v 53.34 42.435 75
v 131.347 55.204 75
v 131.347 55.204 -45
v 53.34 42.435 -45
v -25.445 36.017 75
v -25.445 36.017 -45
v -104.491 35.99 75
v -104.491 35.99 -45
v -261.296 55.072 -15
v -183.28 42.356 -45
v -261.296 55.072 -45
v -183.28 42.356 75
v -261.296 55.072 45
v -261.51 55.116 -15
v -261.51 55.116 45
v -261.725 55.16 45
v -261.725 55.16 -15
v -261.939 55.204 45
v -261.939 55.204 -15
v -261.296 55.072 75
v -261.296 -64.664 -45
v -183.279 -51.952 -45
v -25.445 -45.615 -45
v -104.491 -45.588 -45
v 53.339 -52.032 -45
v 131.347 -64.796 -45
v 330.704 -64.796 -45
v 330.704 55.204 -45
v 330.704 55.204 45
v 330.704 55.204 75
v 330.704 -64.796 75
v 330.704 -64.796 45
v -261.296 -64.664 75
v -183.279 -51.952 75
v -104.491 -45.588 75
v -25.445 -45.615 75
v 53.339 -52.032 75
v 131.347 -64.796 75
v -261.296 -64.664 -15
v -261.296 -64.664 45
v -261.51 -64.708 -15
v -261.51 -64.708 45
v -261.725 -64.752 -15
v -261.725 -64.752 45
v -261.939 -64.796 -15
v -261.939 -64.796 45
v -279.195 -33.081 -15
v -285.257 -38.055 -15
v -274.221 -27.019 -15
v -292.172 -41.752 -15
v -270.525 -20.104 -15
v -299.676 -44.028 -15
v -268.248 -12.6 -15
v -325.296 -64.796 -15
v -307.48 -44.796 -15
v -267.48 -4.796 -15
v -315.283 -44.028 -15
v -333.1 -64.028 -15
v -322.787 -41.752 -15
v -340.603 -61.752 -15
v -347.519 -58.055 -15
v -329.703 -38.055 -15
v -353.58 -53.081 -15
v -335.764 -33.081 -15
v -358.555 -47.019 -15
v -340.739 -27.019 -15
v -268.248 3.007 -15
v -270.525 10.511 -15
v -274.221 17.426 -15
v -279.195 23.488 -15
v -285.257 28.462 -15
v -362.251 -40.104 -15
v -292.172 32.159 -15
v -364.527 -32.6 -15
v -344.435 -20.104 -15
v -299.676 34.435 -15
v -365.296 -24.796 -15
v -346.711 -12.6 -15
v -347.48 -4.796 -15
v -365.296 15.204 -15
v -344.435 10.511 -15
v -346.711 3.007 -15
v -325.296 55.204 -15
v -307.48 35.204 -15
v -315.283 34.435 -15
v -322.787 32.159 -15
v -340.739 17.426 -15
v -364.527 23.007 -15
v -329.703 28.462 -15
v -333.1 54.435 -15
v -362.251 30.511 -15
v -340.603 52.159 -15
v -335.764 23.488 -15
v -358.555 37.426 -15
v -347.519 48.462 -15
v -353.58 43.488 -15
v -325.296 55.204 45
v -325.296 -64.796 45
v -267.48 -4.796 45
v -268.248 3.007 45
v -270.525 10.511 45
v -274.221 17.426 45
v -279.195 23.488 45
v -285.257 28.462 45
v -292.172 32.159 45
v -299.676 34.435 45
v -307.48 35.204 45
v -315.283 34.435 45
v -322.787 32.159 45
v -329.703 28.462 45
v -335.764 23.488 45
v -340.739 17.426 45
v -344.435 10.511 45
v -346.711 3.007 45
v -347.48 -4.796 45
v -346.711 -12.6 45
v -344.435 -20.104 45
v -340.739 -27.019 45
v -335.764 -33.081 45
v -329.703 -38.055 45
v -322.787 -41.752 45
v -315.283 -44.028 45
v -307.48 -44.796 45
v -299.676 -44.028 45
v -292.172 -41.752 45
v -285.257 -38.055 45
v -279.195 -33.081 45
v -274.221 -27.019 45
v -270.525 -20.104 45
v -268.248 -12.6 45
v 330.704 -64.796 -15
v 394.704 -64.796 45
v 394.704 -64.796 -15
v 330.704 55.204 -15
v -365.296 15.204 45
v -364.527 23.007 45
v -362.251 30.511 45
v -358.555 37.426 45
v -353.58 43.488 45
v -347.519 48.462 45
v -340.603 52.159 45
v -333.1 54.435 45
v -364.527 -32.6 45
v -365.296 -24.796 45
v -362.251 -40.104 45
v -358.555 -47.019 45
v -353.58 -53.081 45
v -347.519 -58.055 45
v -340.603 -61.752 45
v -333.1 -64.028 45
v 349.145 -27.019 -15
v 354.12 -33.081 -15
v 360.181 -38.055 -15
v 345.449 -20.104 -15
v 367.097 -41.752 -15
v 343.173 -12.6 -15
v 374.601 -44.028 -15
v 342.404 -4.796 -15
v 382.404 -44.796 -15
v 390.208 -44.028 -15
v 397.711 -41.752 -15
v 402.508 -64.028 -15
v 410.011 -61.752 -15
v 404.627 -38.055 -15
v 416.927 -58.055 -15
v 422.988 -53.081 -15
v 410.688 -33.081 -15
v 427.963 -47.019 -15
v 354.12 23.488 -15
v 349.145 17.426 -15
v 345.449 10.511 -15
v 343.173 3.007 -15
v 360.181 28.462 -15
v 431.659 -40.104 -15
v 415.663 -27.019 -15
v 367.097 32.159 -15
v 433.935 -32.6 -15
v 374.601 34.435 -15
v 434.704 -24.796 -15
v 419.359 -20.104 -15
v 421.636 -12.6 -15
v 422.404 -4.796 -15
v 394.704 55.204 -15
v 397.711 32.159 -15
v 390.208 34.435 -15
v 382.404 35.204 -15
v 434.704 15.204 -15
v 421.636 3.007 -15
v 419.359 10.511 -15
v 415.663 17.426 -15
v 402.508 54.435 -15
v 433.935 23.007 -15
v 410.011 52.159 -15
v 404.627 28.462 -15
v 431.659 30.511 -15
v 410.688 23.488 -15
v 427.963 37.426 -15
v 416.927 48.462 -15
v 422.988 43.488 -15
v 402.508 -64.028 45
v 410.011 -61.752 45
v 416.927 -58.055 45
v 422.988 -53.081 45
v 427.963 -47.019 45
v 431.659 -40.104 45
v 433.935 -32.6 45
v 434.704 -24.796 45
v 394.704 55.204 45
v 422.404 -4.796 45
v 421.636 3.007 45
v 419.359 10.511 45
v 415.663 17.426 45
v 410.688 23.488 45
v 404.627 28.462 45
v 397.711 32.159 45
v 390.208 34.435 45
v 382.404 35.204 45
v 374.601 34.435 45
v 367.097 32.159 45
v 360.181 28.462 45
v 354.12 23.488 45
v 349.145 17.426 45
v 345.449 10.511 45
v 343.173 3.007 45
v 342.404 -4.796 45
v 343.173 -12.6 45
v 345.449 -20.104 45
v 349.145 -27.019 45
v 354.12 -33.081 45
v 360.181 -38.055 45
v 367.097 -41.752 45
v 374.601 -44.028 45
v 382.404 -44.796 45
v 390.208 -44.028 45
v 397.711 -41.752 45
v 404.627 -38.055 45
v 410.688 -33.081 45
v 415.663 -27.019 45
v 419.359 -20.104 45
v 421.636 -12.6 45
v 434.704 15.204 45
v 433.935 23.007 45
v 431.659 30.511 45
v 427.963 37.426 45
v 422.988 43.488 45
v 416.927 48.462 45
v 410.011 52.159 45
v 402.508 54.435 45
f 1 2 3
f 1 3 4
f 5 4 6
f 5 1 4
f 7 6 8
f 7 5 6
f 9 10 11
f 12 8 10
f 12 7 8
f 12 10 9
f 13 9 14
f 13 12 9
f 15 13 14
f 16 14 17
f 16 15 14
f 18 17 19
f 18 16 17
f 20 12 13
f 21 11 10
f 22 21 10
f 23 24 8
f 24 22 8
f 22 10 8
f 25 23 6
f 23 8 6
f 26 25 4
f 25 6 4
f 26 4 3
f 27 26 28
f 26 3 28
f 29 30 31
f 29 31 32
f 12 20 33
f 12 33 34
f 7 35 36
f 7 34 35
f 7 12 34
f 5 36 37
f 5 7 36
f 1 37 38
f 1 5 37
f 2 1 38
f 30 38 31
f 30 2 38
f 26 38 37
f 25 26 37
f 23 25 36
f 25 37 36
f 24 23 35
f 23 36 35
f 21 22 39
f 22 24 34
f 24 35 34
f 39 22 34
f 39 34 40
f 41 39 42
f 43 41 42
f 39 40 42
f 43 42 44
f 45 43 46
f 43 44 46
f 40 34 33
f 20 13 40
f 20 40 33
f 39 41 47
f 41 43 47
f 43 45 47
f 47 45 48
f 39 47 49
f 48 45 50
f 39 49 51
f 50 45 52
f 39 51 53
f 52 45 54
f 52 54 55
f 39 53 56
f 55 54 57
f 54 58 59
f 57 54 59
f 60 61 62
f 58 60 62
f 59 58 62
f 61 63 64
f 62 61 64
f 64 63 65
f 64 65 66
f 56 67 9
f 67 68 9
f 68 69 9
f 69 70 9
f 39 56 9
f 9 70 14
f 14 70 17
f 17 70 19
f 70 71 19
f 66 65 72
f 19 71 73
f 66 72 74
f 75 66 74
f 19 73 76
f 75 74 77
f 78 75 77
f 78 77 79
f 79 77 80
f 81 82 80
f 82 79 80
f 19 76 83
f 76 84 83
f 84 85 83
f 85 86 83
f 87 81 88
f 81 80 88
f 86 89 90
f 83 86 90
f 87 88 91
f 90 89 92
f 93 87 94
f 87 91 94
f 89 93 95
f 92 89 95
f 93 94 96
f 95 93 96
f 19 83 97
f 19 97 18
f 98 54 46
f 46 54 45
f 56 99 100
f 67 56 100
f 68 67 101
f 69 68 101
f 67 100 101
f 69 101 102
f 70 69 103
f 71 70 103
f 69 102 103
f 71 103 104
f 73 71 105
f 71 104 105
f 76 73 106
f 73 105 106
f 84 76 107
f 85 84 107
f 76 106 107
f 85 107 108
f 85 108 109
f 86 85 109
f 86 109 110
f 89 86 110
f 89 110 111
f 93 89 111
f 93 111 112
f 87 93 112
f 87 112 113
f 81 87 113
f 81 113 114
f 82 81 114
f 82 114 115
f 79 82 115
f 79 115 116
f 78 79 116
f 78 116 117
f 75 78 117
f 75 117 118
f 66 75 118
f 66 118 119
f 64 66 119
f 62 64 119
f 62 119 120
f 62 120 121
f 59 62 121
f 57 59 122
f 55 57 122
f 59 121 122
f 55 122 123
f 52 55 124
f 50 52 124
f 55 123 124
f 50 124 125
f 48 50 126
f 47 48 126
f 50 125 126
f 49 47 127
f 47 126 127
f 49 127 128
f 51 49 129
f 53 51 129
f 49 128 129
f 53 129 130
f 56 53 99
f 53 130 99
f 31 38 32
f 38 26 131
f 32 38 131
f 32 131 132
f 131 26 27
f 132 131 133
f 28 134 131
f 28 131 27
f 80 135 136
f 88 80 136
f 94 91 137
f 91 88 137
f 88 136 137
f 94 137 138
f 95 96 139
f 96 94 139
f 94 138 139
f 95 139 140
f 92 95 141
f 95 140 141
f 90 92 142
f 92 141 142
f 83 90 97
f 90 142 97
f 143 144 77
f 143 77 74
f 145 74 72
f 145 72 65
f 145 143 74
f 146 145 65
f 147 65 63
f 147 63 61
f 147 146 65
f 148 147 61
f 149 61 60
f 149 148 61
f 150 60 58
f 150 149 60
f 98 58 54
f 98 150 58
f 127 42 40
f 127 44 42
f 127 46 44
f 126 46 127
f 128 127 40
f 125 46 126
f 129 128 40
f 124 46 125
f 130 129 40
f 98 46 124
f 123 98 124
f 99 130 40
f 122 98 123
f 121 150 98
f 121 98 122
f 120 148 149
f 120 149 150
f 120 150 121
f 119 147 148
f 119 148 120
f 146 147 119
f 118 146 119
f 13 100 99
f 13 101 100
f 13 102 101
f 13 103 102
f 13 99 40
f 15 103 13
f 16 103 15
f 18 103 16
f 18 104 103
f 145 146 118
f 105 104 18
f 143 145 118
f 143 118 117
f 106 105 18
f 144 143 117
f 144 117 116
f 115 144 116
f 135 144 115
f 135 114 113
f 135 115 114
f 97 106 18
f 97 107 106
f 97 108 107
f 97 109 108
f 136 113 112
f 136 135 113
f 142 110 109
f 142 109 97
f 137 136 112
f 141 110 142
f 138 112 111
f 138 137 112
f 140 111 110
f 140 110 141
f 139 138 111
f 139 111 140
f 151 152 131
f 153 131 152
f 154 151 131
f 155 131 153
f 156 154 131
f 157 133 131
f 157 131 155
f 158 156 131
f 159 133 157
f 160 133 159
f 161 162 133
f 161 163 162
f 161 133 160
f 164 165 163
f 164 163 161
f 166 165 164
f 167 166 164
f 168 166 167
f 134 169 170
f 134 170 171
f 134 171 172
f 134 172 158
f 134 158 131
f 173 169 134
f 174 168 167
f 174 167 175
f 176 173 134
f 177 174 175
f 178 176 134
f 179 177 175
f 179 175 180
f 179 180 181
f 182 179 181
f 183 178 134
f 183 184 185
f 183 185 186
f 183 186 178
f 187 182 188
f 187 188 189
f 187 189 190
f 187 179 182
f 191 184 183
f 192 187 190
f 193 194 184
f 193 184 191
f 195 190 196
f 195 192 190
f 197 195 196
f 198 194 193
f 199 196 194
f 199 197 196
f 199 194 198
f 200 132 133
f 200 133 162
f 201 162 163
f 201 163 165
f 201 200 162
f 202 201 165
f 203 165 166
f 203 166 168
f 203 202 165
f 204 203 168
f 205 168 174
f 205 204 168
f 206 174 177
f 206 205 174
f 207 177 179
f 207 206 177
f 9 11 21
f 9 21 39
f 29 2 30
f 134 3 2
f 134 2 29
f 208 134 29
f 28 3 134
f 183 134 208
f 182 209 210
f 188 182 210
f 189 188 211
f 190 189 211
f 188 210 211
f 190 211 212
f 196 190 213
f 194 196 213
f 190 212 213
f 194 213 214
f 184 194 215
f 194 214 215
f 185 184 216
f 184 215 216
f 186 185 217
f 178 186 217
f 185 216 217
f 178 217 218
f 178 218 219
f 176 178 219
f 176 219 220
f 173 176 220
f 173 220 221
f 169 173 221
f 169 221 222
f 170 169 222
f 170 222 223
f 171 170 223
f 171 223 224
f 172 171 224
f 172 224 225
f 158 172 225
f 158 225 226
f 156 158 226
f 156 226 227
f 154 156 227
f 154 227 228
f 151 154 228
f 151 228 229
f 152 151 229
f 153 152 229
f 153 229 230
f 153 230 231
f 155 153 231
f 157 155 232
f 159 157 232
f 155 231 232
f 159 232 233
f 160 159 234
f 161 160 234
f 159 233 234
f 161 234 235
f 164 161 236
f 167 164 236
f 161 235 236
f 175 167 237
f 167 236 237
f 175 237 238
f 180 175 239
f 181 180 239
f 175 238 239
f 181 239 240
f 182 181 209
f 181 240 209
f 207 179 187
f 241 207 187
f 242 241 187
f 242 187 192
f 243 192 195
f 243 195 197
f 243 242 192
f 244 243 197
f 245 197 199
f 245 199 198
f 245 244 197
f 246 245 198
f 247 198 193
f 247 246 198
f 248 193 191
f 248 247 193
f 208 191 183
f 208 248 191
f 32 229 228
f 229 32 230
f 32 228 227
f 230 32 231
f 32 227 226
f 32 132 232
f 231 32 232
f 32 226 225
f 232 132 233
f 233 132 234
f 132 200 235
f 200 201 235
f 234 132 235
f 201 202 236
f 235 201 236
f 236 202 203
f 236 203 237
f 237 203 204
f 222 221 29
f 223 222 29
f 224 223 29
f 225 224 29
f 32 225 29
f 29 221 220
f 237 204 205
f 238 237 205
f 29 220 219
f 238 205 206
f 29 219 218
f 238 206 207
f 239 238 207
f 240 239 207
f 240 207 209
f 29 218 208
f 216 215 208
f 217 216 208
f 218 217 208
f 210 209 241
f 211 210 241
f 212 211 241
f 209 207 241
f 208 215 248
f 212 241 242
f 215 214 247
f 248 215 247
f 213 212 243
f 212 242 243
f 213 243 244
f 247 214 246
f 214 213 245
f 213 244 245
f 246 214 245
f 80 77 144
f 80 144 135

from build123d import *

# Parameters (mm, degrees)
SKETCH1_W           = 200
SKETCH1_H           = 30
BOSS_EXTRUDE1_DEPTH = 30
FILLET1_R           = 10
CUT_EXTRUDE1_DEPTH  = 30
SKETCH3_W           = 7.5
SKETCH3_H           = 30
CUT_EXTRUDE2_DEPTH  = 26
SKETCH4_W           = 7.5
SKETCH4_H           = 30
CUT_EXTRUDE3_DEPTH  = 26
SKETCH5_R           = 10
CUT_EXTRUDE4_DEPTH  = 45
SCALE1_SCALE        = 4


with BuildPart() as part:
    # Sketch1 → Boss-Extrude1 (new body)
    with BuildSketch(Plane.XY):
        with Locations((46.259717806, -4.797058824)):
            Rectangle(SKETCH1_W, SKETCH1_H)
    extrude(amount=BOSS_EXTRUDE1_DEPTH)

    # Fillet1
    fillet1_edges = [part.edges().sort_by_distance(p)[0] for p in [
        (-53.740282194, 10.202941176, 15),
        (146.259717806, 10.202941176, 15),
        (146.259717806, -19.797058824, 15),
        (-53.740282194, -19.797058824, 15),
    ]]
    fillet(fillet1_edges, radius=FILLET1_R)

    # Sketch2 → Cut-Extrude1 (cut)
    with BuildSketch(Plane.XY.offset(30)):
        with BuildLine():
            Line((-27.901084514, 10.202941176), (70.420520136, 10.202941176))
            ThreePointArc((70.420520136, 10.202941176), (21.259717811, 5.202941178), (-27.901084514, 10.202941176))
        make_face()
        with BuildLine():
            Line((-27.901084524, -19.797058824), (70.420520136, -19.797058824))
            ThreePointArc((70.420520136, -19.797058824), (21.259717806, -14.798405243), (-27.901084524, -19.797058824))
        make_face()
    extrude(amount=-CUT_EXTRUDE1_DEPTH, mode=Mode.SUBTRACT)

    # Sketch3 → Cut-Extrude2 (cut)
    with BuildSketch(Plane(origin=(146.259717806, 0, 0), x_dir=(0, 0, -1), z_dir=(1, 0, 0))):
        with Locations((-3.75, -4.797058824)):
            Rectangle(SKETCH3_W, SKETCH3_H)
        with Locations((-26.25, -4.797058824)):
            Rectangle(SKETCH3_W, SKETCH3_H)
    extrude(amount=-CUT_EXTRUDE2_DEPTH, mode=Mode.SUBTRACT)

    # Sketch4 → Cut-Extrude3 (cut)
    with BuildSketch(Plane.ZY.offset(53.740282194)):
        with Locations((26.25, -4.797058824)):
            Rectangle(SKETCH4_W, SKETCH4_H)
        with Locations((3.75, -4.797058824)):
            Rectangle(SKETCH4_W, SKETCH4_H)
    extrude(amount=-CUT_EXTRUDE3_DEPTH, mode=Mode.SUBTRACT)

    # Sketch5 → Cut-Extrude4 (cut)
    with BuildSketch(Plane.XY.offset(30)):
        with Locations((-39.286224807, -4.797058824)):
            Circle(SKETCH5_R)
        with Locations((133.184735123, -4.797058824)):
            Circle(SKETCH5_R)
    extrude(amount=-CUT_EXTRUDE4_DEPTH, mode=Mode.SUBTRACT)


with BuildPart() as part_1:
    # Scale1: scaled about (50.111608126, -4.79729109, 15)
    add(part.part.scale(SCALE1_SCALE).moved(Location((-150.334824378, 14.39187327, -45))))


solid = part_1.part
